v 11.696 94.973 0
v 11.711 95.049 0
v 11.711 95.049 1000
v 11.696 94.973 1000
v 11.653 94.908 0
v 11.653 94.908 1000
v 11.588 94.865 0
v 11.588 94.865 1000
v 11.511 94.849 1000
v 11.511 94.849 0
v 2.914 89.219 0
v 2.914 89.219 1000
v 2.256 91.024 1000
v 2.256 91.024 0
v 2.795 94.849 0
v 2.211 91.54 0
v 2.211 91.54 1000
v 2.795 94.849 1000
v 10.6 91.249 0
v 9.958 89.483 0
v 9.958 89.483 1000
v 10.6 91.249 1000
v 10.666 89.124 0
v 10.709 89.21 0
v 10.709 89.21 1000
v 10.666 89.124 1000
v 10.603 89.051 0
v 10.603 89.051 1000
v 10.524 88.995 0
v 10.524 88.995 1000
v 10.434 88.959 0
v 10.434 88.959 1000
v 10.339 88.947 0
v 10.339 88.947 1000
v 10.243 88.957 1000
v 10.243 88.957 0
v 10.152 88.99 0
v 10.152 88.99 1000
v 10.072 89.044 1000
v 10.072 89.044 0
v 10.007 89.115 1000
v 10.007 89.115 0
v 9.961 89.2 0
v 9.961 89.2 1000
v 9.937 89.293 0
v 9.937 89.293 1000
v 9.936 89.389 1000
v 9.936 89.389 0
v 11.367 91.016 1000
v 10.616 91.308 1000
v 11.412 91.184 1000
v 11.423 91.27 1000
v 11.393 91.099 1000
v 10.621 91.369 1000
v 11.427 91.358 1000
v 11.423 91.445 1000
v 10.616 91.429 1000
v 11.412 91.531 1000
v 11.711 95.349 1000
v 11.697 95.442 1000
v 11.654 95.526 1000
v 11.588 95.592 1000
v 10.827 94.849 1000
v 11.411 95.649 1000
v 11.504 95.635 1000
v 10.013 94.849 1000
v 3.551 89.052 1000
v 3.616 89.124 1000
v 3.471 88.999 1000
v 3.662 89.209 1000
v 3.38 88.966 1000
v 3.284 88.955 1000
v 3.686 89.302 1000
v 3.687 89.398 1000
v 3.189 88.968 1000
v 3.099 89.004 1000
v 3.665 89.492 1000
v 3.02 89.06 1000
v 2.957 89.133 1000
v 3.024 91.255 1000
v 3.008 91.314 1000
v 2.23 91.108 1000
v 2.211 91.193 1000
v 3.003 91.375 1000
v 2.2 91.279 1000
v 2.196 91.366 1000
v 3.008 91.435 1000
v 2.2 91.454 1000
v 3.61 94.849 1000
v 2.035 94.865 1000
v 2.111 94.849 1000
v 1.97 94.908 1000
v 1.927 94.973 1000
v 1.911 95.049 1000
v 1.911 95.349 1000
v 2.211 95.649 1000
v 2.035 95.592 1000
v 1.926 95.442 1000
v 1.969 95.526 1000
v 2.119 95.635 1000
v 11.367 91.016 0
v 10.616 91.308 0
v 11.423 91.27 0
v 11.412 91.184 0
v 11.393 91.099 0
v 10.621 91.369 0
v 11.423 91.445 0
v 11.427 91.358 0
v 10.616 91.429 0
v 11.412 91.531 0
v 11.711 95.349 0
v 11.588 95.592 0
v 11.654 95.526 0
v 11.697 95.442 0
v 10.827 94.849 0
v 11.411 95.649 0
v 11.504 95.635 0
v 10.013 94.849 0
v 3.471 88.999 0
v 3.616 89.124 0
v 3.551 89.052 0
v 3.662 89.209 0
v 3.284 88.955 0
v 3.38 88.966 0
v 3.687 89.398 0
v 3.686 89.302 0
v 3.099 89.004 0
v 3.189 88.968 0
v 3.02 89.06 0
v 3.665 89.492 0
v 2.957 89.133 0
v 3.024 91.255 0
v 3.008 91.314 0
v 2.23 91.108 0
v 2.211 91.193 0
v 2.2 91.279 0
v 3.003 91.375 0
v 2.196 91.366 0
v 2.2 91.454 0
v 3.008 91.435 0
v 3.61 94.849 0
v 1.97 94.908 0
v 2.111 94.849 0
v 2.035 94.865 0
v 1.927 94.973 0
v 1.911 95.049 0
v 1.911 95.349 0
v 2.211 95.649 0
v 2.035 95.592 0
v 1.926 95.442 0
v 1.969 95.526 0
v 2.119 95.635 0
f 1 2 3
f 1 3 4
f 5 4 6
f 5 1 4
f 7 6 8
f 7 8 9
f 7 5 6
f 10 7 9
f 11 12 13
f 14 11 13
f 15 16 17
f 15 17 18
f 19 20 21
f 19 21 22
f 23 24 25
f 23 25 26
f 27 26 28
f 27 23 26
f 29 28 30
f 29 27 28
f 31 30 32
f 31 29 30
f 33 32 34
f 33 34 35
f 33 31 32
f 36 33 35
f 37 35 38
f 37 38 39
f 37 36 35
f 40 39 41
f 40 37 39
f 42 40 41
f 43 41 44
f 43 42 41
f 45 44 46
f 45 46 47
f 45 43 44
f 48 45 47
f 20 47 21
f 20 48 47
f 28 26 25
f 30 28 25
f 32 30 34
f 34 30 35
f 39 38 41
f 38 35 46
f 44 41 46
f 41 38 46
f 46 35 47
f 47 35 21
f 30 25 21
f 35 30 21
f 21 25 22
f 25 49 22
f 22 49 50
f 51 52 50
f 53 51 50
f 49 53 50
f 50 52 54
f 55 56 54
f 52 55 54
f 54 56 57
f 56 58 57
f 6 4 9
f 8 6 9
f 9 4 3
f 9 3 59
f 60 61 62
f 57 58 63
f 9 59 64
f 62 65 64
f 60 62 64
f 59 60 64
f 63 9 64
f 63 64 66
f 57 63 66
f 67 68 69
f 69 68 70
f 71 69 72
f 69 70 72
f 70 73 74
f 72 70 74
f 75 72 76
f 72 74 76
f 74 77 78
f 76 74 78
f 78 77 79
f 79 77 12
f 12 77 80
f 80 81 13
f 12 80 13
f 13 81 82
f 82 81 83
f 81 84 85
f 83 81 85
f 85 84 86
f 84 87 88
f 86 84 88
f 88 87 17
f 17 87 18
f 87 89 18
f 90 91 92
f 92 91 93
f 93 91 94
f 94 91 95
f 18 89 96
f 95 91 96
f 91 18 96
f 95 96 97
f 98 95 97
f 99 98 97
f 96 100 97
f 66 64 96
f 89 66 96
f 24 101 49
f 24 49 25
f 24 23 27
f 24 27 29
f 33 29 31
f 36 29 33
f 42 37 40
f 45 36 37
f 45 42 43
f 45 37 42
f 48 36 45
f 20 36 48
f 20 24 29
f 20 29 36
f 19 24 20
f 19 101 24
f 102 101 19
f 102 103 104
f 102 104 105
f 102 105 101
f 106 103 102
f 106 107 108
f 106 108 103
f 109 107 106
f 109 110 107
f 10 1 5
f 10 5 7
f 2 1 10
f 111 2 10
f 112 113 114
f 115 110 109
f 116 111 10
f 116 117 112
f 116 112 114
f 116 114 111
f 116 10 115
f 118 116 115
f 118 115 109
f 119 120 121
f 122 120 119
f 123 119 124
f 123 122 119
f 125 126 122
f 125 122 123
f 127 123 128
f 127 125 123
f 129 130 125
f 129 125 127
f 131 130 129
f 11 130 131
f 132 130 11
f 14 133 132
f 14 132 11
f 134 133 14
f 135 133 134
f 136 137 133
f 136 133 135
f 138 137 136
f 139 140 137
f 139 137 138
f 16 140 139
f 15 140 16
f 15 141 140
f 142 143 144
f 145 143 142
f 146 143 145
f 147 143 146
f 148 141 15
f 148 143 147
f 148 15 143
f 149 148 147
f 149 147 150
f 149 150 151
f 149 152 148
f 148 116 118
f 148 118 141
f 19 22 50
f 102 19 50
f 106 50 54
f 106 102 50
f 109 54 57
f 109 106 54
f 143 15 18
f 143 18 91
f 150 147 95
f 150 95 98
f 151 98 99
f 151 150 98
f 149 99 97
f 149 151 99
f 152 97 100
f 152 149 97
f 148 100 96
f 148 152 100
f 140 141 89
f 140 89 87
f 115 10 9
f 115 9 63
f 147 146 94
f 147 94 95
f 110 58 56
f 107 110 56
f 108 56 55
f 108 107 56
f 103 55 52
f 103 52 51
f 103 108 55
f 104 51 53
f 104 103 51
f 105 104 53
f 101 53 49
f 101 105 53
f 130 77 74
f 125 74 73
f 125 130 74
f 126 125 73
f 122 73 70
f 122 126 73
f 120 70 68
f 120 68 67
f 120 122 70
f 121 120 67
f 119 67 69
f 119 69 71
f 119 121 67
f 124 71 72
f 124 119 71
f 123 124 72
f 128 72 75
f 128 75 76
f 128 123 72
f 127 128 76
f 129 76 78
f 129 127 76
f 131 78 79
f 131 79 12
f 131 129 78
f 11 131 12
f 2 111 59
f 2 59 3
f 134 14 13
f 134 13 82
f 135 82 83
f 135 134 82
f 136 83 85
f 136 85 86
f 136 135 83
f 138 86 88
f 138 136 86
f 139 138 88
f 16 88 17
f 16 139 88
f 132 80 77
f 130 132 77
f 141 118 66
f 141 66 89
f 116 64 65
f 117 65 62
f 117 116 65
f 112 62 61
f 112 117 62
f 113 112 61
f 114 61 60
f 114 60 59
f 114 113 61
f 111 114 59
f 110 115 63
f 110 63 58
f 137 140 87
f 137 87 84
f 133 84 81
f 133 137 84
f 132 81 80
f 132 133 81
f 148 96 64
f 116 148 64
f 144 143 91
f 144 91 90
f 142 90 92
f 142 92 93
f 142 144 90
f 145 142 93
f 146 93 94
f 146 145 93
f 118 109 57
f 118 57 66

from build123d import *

# Parameters (mm, degrees)
EXTRUDE_1_DEPTH = 1000


with BuildPart() as part:
    # 草图1 → 拉伸1 (new body)
    with BuildSketch(Plane.XY):
        with BuildLine():
            Line((9.957625481, 89.483322587), (10.600277657, 91.248994929))
            ThreePointArc((10.600277657, 91.248994929), (10.620053384, 91.338197469), (10.616067953, 91.429478841))
            Line((10.616067953, 91.429478841), (10.013039731, 94.849421835))
            Line((10.013039731, 94.849421835), (3.609954409, 94.849421835))
            Line((3.609954409, 94.849421835), (3.007969074, 91.435393352))
            ThreePointArc((3.007969074, 91.435393352), (3.003983643, 91.34411198), (3.02375937, 91.25490944))
            Line((3.02375937, 91.25490944), (3.665329884, 89.49220894))
            ThreePointArc((3.665329884, 89.49220894), (3.426260893, 88.979523834), (2.913575787, 89.218592825))
            Line((2.913575787, 89.218592825), (2.25631362, 91.024405789))
            ThreePointArc((2.25631362, 91.024405789), (2.199811543, 91.27927019), (2.211198488, 91.54007411))
            Line((2.211198488, 91.54007411), (2.79472578, 94.849421835))
            Line((2.79472578, 94.849421835), (2.11149707, 94.849421835))
            ThreePointArc((2.11149707, 94.849421835), (1.970075714, 94.908000479), (1.91149707, 95.049421835))
            Line((1.91149707, 95.049421835), (1.91149707, 95.349421835))
            ThreePointArc((1.91149707, 95.349421835), (1.999365035, 95.56155387), (2.21149707, 95.649421835))
            Line((2.21149707, 95.649421835), (11.41149707, 95.649421835))
            ThreePointArc((11.41149707, 95.649421835), (11.623629104, 95.56155387), (11.71149707, 95.349421835))
            Line((11.71149707, 95.349421835), (11.71149707, 95.049421835))
            ThreePointArc((11.71149707, 95.049421835), (11.652918426, 94.908000479), (11.51149707, 94.849421835))
            Line((11.51149707, 94.849421835), (10.826662681, 94.849421835))
            Line((10.826662681, 94.849421835), (11.411756877, 91.531187757))
            ThreePointArc((11.411756877, 91.531187757), (11.423143822, 91.270383837), (11.366641745, 91.015519436))
            Line((11.366641745, 91.015519436), (10.709379578, 89.209706473))
            ThreePointArc((10.709379578, 89.209706473), (10.196694472, 88.970637482), (9.957625481, 89.483322587))
        make_face()
    extrude(amount=EXTRUDE_1_DEPTH)


solid = part.part
